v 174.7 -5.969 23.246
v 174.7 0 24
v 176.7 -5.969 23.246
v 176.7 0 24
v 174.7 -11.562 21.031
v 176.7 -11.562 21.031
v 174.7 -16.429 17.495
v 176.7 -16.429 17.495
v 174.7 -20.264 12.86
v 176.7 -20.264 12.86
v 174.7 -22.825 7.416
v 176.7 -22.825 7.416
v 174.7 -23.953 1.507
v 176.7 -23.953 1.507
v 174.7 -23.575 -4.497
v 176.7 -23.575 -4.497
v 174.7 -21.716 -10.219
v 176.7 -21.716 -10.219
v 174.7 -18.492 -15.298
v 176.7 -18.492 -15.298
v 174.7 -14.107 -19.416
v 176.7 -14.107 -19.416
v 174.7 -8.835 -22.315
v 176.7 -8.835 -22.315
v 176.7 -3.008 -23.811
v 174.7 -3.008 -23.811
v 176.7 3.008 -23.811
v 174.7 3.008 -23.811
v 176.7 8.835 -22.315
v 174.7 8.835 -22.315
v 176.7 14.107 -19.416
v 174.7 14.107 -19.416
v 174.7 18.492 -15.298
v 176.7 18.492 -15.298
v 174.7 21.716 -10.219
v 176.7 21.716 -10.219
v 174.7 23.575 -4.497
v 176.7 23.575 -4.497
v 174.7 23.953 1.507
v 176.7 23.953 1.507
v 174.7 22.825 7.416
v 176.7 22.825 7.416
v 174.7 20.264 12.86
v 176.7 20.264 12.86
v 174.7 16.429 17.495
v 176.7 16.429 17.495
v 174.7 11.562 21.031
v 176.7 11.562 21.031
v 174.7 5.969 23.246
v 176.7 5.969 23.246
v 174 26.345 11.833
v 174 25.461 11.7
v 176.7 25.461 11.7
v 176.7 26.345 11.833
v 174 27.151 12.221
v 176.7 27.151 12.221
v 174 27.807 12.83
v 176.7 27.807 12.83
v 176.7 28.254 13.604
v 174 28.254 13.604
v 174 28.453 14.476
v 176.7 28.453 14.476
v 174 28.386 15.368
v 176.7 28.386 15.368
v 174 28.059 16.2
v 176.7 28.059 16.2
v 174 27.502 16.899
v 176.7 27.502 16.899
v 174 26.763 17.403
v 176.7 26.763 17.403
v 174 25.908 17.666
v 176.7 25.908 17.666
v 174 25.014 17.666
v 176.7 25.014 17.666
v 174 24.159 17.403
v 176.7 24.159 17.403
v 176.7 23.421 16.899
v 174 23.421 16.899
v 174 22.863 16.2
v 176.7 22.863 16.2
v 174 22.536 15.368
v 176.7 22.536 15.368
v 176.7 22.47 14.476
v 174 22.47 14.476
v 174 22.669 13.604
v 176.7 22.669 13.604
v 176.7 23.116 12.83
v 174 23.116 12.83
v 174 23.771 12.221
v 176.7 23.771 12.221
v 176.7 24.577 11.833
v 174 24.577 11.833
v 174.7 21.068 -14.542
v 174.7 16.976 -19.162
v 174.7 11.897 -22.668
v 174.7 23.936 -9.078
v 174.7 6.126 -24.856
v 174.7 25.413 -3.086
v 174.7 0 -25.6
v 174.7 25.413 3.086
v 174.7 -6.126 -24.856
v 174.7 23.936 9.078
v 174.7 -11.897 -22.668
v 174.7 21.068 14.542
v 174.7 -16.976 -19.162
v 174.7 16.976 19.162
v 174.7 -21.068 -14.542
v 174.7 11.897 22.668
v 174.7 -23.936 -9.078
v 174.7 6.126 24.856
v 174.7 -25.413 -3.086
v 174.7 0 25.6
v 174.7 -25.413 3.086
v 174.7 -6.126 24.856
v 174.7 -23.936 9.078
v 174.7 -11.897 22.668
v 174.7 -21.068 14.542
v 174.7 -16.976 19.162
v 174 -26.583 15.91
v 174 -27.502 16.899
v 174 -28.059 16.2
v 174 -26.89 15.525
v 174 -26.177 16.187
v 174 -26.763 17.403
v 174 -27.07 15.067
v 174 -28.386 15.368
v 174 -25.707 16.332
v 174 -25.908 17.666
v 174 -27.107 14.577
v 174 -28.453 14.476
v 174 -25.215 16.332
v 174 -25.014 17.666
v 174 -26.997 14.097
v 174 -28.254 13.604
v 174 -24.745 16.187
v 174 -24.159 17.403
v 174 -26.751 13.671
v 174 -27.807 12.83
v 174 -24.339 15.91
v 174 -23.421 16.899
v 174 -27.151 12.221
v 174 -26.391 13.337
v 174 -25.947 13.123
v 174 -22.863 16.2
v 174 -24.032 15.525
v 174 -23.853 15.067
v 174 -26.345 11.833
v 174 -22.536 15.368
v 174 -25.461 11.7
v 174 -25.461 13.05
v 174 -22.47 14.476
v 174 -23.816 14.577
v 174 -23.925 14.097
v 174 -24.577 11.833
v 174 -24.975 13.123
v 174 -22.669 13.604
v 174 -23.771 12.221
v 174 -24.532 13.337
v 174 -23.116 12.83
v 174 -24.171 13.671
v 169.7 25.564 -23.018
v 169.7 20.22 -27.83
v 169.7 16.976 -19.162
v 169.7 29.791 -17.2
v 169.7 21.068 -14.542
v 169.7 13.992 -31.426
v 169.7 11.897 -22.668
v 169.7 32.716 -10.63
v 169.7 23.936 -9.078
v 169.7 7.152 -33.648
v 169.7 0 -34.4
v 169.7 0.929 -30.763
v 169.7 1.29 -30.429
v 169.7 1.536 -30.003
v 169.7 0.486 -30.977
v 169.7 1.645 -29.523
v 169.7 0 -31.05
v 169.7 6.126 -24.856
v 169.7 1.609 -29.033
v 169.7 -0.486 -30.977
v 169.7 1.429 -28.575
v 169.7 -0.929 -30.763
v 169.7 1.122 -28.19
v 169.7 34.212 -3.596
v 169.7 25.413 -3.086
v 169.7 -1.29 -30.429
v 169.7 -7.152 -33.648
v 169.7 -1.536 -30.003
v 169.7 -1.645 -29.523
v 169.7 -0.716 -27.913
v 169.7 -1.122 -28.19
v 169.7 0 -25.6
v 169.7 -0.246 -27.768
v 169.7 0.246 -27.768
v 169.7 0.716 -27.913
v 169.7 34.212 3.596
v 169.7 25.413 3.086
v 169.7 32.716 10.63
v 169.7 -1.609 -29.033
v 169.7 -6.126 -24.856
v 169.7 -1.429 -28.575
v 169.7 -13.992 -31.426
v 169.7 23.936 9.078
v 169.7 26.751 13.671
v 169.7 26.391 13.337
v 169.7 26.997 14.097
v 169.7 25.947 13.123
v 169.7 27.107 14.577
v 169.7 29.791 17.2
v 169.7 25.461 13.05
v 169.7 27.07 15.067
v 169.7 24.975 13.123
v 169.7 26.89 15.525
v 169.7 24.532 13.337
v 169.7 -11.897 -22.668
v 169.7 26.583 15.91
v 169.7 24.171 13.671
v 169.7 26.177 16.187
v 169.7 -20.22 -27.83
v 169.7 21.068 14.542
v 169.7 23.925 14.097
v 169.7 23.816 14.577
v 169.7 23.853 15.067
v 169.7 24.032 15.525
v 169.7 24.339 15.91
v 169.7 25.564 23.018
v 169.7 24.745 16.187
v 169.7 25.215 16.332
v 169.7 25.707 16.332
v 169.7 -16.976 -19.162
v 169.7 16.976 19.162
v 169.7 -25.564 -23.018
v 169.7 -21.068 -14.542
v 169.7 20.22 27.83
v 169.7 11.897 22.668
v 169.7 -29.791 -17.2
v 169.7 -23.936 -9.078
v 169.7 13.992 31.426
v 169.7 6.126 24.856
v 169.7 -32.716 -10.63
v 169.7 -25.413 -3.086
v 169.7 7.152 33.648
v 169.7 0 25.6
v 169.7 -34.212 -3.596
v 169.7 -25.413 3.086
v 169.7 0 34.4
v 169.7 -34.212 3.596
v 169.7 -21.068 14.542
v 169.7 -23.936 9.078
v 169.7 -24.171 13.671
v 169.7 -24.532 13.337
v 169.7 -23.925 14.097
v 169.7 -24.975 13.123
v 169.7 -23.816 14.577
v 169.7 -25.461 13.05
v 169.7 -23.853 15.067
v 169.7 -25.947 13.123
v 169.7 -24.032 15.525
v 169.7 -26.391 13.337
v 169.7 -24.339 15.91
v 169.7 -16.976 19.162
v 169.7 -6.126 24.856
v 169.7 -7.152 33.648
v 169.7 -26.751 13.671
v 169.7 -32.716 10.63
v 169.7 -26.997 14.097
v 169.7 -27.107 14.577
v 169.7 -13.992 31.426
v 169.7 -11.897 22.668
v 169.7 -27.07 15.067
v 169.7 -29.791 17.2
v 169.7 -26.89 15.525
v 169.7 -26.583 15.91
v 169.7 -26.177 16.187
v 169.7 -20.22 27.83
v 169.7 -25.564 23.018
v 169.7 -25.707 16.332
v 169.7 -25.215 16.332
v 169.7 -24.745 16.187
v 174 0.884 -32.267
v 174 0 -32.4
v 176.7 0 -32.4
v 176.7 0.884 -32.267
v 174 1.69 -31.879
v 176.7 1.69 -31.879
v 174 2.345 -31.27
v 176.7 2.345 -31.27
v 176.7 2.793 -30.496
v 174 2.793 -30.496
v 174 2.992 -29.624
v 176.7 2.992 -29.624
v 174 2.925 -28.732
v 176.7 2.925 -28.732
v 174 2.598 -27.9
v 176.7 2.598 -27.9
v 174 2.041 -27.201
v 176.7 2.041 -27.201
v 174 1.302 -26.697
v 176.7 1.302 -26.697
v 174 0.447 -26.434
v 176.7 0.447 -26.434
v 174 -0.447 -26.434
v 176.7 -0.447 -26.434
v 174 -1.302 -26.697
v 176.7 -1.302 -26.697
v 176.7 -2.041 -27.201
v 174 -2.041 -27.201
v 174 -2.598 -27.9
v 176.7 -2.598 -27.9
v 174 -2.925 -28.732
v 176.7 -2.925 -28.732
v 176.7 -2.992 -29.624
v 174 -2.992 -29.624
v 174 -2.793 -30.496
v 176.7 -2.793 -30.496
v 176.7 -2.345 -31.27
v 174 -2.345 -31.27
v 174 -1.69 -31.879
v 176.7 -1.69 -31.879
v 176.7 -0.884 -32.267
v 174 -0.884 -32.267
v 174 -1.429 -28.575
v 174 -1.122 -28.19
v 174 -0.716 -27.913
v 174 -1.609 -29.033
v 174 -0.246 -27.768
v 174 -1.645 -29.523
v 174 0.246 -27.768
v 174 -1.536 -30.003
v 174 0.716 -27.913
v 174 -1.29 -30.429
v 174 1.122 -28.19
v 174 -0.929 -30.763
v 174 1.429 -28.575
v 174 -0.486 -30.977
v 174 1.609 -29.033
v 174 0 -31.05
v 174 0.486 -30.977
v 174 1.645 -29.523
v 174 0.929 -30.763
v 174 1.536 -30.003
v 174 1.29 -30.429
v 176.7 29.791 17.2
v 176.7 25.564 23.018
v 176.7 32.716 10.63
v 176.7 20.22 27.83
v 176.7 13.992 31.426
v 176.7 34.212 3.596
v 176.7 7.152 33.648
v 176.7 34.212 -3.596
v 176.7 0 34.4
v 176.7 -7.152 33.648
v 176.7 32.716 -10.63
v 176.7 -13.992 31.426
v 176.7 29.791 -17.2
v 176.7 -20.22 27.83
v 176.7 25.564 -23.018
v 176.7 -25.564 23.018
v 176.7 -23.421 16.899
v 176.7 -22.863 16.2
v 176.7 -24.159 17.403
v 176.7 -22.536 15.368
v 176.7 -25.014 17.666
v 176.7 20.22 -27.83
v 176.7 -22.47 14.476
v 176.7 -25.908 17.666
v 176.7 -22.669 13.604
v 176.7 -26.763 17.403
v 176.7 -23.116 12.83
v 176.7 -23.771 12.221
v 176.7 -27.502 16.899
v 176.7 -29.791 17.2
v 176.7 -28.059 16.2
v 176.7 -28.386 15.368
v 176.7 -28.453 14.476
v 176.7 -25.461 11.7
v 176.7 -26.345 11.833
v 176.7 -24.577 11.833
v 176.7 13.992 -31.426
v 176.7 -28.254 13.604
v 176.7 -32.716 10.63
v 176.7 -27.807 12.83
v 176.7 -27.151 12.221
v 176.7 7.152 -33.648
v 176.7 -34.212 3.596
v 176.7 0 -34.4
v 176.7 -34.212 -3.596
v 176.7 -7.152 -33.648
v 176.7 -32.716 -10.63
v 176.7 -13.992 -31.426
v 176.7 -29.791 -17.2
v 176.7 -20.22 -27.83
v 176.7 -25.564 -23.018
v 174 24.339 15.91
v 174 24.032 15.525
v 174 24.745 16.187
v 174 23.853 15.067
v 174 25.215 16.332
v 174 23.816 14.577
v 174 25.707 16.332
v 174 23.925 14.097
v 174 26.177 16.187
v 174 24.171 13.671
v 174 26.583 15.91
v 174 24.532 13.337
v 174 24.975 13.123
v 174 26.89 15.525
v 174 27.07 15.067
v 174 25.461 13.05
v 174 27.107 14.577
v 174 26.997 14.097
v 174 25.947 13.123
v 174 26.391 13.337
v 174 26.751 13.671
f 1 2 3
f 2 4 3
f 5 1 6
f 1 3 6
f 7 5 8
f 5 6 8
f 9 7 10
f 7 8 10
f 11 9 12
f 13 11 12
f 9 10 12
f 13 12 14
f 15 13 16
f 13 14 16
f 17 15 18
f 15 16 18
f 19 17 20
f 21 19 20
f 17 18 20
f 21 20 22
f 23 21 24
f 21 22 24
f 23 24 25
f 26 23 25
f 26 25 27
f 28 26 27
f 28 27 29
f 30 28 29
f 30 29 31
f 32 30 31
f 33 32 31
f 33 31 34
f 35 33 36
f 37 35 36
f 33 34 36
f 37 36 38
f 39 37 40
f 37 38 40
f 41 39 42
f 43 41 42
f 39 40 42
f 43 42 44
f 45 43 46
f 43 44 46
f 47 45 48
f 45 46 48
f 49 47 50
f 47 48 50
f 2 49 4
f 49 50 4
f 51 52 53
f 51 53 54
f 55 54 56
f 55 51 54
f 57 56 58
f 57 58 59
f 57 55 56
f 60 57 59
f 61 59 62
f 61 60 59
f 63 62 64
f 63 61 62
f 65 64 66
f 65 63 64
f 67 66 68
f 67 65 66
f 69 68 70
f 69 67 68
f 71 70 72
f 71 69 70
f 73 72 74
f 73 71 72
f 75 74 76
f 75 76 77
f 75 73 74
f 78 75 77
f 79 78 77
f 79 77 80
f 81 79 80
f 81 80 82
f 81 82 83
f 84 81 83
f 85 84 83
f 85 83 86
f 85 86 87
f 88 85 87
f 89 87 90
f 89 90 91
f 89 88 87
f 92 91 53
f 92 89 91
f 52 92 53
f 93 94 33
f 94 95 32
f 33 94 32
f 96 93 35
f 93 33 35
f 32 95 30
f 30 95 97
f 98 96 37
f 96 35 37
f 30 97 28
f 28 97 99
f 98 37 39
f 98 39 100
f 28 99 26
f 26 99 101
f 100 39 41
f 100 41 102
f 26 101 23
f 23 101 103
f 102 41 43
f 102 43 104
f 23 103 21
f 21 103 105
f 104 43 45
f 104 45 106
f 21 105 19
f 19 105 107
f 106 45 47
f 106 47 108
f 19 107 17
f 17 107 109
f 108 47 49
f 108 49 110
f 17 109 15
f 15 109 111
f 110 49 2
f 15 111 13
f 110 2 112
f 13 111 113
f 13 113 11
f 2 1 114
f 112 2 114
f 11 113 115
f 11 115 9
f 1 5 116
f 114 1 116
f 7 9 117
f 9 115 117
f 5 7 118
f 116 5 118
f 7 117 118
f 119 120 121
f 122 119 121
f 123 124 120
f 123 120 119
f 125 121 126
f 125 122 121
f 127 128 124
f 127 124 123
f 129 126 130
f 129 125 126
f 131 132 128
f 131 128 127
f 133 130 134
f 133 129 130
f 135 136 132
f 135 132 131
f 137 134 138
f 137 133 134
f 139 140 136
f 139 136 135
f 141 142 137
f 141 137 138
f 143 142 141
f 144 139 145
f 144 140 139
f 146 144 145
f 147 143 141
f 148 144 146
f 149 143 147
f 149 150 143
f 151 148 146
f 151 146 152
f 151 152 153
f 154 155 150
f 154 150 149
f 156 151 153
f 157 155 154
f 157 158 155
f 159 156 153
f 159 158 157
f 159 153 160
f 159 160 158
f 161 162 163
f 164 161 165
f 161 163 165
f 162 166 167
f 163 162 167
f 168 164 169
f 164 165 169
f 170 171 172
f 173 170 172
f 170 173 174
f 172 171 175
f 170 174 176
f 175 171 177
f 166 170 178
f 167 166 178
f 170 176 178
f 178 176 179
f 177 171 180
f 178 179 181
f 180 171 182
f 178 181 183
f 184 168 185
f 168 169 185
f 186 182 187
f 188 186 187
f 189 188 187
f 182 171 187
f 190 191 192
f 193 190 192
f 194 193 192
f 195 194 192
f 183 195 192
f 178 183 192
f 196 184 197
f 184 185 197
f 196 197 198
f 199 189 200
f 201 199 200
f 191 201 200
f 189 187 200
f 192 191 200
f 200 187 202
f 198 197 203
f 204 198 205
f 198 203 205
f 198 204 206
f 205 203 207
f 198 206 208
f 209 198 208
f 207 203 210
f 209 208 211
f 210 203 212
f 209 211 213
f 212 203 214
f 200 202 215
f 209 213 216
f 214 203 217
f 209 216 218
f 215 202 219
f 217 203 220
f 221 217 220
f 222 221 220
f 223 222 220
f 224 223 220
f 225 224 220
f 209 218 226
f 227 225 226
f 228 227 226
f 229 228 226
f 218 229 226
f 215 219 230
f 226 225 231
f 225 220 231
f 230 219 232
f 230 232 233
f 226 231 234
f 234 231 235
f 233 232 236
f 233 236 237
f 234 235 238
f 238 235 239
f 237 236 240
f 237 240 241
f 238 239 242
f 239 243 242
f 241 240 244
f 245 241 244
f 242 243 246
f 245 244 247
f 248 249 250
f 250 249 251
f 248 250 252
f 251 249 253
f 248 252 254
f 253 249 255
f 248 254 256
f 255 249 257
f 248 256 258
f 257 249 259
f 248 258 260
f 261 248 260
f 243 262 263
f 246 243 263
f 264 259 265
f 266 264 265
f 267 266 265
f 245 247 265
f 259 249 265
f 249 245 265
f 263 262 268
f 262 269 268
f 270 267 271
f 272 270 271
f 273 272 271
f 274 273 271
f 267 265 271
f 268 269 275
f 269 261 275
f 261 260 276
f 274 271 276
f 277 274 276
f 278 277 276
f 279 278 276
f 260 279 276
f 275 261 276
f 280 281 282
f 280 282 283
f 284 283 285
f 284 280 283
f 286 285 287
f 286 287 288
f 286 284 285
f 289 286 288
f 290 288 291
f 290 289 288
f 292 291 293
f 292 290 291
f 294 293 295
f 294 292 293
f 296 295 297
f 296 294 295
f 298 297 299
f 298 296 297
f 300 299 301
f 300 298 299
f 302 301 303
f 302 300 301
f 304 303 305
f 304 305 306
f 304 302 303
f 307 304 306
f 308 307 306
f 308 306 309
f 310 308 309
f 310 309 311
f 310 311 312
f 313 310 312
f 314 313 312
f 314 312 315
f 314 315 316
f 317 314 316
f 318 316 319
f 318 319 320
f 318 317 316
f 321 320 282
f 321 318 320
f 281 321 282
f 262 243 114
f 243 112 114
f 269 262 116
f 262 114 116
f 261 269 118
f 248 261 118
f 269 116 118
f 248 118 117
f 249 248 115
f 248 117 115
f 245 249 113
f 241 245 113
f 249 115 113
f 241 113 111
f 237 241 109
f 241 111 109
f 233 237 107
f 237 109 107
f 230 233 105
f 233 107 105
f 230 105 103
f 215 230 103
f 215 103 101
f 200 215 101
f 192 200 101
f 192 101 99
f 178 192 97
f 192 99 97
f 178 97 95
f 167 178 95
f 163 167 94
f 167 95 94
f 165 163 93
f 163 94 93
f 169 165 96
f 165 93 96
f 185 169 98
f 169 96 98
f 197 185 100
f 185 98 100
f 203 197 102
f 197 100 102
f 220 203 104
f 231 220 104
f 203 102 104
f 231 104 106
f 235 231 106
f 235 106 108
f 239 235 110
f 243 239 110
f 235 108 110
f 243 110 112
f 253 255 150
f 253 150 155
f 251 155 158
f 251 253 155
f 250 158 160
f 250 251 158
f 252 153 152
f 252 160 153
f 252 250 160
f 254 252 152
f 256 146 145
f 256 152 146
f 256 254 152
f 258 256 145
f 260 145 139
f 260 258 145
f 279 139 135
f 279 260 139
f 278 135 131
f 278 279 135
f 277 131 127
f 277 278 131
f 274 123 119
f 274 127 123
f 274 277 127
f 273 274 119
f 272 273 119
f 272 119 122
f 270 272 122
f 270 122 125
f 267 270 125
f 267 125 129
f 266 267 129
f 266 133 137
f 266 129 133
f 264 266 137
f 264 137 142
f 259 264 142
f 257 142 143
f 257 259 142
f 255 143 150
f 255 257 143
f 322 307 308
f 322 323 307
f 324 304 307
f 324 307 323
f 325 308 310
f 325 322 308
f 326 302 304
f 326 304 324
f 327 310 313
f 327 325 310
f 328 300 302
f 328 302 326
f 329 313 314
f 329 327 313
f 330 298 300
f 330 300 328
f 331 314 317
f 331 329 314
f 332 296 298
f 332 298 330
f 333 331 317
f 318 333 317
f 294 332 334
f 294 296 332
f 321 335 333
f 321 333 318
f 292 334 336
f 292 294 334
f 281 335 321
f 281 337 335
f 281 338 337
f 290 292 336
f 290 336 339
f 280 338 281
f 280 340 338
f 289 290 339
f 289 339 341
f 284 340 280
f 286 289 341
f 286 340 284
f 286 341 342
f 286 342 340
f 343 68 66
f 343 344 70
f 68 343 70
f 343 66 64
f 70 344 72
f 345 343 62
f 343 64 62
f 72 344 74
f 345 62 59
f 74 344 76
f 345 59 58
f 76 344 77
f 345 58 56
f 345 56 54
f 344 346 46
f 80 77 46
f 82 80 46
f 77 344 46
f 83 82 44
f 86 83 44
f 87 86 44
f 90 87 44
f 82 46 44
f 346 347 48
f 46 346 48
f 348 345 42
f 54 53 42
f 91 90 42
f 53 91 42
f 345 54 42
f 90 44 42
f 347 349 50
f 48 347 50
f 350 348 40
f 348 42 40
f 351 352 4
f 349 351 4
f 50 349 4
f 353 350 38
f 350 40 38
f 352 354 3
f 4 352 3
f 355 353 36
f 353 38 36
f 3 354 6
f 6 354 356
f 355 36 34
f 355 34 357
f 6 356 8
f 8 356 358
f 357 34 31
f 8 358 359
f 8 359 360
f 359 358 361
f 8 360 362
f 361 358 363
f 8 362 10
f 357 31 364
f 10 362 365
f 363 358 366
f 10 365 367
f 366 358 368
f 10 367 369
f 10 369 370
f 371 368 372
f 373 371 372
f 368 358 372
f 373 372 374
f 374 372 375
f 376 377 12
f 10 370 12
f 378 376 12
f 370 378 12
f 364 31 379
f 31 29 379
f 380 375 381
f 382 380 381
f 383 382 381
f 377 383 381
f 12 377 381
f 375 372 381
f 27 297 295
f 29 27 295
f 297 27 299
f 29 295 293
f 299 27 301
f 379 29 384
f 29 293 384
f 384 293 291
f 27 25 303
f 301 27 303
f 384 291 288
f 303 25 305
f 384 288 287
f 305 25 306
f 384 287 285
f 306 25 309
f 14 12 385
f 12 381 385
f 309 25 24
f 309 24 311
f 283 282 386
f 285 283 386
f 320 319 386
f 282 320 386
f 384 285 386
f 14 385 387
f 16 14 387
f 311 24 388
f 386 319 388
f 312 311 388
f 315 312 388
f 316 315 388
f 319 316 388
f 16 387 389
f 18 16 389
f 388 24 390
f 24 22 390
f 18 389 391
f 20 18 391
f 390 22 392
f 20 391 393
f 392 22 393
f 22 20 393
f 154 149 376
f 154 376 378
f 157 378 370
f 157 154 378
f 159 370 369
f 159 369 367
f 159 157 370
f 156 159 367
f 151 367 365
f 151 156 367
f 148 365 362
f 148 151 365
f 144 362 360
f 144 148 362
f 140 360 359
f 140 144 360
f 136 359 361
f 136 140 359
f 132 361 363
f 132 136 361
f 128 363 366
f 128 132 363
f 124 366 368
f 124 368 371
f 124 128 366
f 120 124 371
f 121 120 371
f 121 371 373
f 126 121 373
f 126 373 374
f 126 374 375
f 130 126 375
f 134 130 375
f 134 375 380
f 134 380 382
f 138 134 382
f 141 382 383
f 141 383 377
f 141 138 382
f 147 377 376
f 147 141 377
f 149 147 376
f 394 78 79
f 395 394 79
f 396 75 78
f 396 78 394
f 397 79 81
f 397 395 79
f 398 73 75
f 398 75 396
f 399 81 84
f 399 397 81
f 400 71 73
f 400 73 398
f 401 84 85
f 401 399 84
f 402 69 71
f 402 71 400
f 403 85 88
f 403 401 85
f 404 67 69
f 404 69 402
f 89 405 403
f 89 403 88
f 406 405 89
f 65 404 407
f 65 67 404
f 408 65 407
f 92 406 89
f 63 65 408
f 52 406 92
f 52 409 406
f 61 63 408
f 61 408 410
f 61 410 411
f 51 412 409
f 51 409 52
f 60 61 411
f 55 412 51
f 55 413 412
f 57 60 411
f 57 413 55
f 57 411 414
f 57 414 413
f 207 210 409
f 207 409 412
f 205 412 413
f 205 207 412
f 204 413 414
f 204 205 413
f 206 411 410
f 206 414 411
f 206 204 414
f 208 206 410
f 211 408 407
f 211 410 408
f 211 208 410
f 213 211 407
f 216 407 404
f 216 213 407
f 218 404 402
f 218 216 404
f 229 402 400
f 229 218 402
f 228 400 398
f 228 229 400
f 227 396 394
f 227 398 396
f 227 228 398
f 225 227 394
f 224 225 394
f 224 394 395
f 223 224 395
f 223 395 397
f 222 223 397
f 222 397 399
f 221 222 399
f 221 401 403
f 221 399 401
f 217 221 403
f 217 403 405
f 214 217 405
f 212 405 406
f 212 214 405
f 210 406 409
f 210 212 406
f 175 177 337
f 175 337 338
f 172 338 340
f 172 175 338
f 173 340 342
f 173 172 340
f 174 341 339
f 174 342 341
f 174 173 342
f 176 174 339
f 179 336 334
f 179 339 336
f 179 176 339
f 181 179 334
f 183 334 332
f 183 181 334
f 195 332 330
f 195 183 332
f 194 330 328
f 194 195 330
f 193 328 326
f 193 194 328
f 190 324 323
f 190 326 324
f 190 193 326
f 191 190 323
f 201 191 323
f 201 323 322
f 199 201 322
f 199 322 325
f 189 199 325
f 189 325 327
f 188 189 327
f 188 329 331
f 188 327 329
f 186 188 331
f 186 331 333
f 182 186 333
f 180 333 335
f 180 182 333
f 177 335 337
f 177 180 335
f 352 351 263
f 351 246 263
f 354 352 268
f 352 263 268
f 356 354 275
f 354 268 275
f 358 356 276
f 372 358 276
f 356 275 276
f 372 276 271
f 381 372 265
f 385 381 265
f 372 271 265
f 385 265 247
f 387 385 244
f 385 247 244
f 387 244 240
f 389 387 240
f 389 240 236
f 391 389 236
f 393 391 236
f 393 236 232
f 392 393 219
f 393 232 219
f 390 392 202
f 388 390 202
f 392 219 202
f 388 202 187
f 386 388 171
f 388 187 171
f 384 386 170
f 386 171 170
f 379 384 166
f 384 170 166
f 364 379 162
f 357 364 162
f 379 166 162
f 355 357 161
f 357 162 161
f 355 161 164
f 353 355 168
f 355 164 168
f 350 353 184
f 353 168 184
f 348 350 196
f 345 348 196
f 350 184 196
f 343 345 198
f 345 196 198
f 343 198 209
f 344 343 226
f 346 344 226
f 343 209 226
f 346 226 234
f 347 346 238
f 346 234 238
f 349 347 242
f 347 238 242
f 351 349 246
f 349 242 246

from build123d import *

# Parameters (mm, degrees)
AXIAL_HOLES_DEPTH      = 184.274684558
AXIAL_HOLES_DEPTH_BACK = 184.274684558
SKETCH2_R              = 1.65
CUT_EXTRUDE2_START     = 174
SKETCH3_R              = 3
CUT_EXTRUDE2_DEPTH     = 2.7


with BuildPart() as part:
    # Axial profile (mm) → Full revolution (revolve)
    with BuildSketch(Plane.XY, mode=Mode.PRIVATE) as full_revolution_sk:
        Polygon((169.7, 25.6), (174.7, 25.6), (174.7, 24), (176.7, 24), (176.7, 34.4), (169.7, 34.4), align=None)
    revolve(full_revolution_sk.sketch.rotate(Axis((-110, 0, 0), (1, 0, 0)), 90), axis=Axis((-110, 0, 0), (1, 0, 0)))

    # Sketch2 → Axial holes (cut, two sides: drawn at the far end of the back side and taken through both)
    with BuildSketch(Plane(origin=(0, 0, 0), x_dir=(0, 0, -1), z_dir=(1, 0, 0)).offset(-AXIAL_HOLES_DEPTH_BACK)):
        with Locations((29.4, 0)):
            Circle(SKETCH2_R)
        with Locations((-14.7, 25.461146871)):
            Circle(SKETCH2_R)
        with Locations((-14.7, -25.461146871)):
            Circle(SKETCH2_R)
    extrude(amount=AXIAL_HOLES_DEPTH + AXIAL_HOLES_DEPTH_BACK, mode=Mode.SUBTRACT)

    # Sketch3 → Cut-Extrude2 (cut)
    with BuildSketch(Plane(origin=(0, 0, 0), x_dir=(0, 0, -1), z_dir=(1, 0, 0)).offset(CUT_EXTRUDE2_START)):
        with Locations((29.4, 0)):
            Circle(SKETCH3_R)
        with Locations((-14.7, 25.461146871)):
            Circle(SKETCH3_R)
        with Locations((-14.7, -25.461146871)):
            Circle(SKETCH3_R)
    extrude(amount=CUT_EXTRUDE2_DEPTH, mode=Mode.SUBTRACT)


solid = part.part
